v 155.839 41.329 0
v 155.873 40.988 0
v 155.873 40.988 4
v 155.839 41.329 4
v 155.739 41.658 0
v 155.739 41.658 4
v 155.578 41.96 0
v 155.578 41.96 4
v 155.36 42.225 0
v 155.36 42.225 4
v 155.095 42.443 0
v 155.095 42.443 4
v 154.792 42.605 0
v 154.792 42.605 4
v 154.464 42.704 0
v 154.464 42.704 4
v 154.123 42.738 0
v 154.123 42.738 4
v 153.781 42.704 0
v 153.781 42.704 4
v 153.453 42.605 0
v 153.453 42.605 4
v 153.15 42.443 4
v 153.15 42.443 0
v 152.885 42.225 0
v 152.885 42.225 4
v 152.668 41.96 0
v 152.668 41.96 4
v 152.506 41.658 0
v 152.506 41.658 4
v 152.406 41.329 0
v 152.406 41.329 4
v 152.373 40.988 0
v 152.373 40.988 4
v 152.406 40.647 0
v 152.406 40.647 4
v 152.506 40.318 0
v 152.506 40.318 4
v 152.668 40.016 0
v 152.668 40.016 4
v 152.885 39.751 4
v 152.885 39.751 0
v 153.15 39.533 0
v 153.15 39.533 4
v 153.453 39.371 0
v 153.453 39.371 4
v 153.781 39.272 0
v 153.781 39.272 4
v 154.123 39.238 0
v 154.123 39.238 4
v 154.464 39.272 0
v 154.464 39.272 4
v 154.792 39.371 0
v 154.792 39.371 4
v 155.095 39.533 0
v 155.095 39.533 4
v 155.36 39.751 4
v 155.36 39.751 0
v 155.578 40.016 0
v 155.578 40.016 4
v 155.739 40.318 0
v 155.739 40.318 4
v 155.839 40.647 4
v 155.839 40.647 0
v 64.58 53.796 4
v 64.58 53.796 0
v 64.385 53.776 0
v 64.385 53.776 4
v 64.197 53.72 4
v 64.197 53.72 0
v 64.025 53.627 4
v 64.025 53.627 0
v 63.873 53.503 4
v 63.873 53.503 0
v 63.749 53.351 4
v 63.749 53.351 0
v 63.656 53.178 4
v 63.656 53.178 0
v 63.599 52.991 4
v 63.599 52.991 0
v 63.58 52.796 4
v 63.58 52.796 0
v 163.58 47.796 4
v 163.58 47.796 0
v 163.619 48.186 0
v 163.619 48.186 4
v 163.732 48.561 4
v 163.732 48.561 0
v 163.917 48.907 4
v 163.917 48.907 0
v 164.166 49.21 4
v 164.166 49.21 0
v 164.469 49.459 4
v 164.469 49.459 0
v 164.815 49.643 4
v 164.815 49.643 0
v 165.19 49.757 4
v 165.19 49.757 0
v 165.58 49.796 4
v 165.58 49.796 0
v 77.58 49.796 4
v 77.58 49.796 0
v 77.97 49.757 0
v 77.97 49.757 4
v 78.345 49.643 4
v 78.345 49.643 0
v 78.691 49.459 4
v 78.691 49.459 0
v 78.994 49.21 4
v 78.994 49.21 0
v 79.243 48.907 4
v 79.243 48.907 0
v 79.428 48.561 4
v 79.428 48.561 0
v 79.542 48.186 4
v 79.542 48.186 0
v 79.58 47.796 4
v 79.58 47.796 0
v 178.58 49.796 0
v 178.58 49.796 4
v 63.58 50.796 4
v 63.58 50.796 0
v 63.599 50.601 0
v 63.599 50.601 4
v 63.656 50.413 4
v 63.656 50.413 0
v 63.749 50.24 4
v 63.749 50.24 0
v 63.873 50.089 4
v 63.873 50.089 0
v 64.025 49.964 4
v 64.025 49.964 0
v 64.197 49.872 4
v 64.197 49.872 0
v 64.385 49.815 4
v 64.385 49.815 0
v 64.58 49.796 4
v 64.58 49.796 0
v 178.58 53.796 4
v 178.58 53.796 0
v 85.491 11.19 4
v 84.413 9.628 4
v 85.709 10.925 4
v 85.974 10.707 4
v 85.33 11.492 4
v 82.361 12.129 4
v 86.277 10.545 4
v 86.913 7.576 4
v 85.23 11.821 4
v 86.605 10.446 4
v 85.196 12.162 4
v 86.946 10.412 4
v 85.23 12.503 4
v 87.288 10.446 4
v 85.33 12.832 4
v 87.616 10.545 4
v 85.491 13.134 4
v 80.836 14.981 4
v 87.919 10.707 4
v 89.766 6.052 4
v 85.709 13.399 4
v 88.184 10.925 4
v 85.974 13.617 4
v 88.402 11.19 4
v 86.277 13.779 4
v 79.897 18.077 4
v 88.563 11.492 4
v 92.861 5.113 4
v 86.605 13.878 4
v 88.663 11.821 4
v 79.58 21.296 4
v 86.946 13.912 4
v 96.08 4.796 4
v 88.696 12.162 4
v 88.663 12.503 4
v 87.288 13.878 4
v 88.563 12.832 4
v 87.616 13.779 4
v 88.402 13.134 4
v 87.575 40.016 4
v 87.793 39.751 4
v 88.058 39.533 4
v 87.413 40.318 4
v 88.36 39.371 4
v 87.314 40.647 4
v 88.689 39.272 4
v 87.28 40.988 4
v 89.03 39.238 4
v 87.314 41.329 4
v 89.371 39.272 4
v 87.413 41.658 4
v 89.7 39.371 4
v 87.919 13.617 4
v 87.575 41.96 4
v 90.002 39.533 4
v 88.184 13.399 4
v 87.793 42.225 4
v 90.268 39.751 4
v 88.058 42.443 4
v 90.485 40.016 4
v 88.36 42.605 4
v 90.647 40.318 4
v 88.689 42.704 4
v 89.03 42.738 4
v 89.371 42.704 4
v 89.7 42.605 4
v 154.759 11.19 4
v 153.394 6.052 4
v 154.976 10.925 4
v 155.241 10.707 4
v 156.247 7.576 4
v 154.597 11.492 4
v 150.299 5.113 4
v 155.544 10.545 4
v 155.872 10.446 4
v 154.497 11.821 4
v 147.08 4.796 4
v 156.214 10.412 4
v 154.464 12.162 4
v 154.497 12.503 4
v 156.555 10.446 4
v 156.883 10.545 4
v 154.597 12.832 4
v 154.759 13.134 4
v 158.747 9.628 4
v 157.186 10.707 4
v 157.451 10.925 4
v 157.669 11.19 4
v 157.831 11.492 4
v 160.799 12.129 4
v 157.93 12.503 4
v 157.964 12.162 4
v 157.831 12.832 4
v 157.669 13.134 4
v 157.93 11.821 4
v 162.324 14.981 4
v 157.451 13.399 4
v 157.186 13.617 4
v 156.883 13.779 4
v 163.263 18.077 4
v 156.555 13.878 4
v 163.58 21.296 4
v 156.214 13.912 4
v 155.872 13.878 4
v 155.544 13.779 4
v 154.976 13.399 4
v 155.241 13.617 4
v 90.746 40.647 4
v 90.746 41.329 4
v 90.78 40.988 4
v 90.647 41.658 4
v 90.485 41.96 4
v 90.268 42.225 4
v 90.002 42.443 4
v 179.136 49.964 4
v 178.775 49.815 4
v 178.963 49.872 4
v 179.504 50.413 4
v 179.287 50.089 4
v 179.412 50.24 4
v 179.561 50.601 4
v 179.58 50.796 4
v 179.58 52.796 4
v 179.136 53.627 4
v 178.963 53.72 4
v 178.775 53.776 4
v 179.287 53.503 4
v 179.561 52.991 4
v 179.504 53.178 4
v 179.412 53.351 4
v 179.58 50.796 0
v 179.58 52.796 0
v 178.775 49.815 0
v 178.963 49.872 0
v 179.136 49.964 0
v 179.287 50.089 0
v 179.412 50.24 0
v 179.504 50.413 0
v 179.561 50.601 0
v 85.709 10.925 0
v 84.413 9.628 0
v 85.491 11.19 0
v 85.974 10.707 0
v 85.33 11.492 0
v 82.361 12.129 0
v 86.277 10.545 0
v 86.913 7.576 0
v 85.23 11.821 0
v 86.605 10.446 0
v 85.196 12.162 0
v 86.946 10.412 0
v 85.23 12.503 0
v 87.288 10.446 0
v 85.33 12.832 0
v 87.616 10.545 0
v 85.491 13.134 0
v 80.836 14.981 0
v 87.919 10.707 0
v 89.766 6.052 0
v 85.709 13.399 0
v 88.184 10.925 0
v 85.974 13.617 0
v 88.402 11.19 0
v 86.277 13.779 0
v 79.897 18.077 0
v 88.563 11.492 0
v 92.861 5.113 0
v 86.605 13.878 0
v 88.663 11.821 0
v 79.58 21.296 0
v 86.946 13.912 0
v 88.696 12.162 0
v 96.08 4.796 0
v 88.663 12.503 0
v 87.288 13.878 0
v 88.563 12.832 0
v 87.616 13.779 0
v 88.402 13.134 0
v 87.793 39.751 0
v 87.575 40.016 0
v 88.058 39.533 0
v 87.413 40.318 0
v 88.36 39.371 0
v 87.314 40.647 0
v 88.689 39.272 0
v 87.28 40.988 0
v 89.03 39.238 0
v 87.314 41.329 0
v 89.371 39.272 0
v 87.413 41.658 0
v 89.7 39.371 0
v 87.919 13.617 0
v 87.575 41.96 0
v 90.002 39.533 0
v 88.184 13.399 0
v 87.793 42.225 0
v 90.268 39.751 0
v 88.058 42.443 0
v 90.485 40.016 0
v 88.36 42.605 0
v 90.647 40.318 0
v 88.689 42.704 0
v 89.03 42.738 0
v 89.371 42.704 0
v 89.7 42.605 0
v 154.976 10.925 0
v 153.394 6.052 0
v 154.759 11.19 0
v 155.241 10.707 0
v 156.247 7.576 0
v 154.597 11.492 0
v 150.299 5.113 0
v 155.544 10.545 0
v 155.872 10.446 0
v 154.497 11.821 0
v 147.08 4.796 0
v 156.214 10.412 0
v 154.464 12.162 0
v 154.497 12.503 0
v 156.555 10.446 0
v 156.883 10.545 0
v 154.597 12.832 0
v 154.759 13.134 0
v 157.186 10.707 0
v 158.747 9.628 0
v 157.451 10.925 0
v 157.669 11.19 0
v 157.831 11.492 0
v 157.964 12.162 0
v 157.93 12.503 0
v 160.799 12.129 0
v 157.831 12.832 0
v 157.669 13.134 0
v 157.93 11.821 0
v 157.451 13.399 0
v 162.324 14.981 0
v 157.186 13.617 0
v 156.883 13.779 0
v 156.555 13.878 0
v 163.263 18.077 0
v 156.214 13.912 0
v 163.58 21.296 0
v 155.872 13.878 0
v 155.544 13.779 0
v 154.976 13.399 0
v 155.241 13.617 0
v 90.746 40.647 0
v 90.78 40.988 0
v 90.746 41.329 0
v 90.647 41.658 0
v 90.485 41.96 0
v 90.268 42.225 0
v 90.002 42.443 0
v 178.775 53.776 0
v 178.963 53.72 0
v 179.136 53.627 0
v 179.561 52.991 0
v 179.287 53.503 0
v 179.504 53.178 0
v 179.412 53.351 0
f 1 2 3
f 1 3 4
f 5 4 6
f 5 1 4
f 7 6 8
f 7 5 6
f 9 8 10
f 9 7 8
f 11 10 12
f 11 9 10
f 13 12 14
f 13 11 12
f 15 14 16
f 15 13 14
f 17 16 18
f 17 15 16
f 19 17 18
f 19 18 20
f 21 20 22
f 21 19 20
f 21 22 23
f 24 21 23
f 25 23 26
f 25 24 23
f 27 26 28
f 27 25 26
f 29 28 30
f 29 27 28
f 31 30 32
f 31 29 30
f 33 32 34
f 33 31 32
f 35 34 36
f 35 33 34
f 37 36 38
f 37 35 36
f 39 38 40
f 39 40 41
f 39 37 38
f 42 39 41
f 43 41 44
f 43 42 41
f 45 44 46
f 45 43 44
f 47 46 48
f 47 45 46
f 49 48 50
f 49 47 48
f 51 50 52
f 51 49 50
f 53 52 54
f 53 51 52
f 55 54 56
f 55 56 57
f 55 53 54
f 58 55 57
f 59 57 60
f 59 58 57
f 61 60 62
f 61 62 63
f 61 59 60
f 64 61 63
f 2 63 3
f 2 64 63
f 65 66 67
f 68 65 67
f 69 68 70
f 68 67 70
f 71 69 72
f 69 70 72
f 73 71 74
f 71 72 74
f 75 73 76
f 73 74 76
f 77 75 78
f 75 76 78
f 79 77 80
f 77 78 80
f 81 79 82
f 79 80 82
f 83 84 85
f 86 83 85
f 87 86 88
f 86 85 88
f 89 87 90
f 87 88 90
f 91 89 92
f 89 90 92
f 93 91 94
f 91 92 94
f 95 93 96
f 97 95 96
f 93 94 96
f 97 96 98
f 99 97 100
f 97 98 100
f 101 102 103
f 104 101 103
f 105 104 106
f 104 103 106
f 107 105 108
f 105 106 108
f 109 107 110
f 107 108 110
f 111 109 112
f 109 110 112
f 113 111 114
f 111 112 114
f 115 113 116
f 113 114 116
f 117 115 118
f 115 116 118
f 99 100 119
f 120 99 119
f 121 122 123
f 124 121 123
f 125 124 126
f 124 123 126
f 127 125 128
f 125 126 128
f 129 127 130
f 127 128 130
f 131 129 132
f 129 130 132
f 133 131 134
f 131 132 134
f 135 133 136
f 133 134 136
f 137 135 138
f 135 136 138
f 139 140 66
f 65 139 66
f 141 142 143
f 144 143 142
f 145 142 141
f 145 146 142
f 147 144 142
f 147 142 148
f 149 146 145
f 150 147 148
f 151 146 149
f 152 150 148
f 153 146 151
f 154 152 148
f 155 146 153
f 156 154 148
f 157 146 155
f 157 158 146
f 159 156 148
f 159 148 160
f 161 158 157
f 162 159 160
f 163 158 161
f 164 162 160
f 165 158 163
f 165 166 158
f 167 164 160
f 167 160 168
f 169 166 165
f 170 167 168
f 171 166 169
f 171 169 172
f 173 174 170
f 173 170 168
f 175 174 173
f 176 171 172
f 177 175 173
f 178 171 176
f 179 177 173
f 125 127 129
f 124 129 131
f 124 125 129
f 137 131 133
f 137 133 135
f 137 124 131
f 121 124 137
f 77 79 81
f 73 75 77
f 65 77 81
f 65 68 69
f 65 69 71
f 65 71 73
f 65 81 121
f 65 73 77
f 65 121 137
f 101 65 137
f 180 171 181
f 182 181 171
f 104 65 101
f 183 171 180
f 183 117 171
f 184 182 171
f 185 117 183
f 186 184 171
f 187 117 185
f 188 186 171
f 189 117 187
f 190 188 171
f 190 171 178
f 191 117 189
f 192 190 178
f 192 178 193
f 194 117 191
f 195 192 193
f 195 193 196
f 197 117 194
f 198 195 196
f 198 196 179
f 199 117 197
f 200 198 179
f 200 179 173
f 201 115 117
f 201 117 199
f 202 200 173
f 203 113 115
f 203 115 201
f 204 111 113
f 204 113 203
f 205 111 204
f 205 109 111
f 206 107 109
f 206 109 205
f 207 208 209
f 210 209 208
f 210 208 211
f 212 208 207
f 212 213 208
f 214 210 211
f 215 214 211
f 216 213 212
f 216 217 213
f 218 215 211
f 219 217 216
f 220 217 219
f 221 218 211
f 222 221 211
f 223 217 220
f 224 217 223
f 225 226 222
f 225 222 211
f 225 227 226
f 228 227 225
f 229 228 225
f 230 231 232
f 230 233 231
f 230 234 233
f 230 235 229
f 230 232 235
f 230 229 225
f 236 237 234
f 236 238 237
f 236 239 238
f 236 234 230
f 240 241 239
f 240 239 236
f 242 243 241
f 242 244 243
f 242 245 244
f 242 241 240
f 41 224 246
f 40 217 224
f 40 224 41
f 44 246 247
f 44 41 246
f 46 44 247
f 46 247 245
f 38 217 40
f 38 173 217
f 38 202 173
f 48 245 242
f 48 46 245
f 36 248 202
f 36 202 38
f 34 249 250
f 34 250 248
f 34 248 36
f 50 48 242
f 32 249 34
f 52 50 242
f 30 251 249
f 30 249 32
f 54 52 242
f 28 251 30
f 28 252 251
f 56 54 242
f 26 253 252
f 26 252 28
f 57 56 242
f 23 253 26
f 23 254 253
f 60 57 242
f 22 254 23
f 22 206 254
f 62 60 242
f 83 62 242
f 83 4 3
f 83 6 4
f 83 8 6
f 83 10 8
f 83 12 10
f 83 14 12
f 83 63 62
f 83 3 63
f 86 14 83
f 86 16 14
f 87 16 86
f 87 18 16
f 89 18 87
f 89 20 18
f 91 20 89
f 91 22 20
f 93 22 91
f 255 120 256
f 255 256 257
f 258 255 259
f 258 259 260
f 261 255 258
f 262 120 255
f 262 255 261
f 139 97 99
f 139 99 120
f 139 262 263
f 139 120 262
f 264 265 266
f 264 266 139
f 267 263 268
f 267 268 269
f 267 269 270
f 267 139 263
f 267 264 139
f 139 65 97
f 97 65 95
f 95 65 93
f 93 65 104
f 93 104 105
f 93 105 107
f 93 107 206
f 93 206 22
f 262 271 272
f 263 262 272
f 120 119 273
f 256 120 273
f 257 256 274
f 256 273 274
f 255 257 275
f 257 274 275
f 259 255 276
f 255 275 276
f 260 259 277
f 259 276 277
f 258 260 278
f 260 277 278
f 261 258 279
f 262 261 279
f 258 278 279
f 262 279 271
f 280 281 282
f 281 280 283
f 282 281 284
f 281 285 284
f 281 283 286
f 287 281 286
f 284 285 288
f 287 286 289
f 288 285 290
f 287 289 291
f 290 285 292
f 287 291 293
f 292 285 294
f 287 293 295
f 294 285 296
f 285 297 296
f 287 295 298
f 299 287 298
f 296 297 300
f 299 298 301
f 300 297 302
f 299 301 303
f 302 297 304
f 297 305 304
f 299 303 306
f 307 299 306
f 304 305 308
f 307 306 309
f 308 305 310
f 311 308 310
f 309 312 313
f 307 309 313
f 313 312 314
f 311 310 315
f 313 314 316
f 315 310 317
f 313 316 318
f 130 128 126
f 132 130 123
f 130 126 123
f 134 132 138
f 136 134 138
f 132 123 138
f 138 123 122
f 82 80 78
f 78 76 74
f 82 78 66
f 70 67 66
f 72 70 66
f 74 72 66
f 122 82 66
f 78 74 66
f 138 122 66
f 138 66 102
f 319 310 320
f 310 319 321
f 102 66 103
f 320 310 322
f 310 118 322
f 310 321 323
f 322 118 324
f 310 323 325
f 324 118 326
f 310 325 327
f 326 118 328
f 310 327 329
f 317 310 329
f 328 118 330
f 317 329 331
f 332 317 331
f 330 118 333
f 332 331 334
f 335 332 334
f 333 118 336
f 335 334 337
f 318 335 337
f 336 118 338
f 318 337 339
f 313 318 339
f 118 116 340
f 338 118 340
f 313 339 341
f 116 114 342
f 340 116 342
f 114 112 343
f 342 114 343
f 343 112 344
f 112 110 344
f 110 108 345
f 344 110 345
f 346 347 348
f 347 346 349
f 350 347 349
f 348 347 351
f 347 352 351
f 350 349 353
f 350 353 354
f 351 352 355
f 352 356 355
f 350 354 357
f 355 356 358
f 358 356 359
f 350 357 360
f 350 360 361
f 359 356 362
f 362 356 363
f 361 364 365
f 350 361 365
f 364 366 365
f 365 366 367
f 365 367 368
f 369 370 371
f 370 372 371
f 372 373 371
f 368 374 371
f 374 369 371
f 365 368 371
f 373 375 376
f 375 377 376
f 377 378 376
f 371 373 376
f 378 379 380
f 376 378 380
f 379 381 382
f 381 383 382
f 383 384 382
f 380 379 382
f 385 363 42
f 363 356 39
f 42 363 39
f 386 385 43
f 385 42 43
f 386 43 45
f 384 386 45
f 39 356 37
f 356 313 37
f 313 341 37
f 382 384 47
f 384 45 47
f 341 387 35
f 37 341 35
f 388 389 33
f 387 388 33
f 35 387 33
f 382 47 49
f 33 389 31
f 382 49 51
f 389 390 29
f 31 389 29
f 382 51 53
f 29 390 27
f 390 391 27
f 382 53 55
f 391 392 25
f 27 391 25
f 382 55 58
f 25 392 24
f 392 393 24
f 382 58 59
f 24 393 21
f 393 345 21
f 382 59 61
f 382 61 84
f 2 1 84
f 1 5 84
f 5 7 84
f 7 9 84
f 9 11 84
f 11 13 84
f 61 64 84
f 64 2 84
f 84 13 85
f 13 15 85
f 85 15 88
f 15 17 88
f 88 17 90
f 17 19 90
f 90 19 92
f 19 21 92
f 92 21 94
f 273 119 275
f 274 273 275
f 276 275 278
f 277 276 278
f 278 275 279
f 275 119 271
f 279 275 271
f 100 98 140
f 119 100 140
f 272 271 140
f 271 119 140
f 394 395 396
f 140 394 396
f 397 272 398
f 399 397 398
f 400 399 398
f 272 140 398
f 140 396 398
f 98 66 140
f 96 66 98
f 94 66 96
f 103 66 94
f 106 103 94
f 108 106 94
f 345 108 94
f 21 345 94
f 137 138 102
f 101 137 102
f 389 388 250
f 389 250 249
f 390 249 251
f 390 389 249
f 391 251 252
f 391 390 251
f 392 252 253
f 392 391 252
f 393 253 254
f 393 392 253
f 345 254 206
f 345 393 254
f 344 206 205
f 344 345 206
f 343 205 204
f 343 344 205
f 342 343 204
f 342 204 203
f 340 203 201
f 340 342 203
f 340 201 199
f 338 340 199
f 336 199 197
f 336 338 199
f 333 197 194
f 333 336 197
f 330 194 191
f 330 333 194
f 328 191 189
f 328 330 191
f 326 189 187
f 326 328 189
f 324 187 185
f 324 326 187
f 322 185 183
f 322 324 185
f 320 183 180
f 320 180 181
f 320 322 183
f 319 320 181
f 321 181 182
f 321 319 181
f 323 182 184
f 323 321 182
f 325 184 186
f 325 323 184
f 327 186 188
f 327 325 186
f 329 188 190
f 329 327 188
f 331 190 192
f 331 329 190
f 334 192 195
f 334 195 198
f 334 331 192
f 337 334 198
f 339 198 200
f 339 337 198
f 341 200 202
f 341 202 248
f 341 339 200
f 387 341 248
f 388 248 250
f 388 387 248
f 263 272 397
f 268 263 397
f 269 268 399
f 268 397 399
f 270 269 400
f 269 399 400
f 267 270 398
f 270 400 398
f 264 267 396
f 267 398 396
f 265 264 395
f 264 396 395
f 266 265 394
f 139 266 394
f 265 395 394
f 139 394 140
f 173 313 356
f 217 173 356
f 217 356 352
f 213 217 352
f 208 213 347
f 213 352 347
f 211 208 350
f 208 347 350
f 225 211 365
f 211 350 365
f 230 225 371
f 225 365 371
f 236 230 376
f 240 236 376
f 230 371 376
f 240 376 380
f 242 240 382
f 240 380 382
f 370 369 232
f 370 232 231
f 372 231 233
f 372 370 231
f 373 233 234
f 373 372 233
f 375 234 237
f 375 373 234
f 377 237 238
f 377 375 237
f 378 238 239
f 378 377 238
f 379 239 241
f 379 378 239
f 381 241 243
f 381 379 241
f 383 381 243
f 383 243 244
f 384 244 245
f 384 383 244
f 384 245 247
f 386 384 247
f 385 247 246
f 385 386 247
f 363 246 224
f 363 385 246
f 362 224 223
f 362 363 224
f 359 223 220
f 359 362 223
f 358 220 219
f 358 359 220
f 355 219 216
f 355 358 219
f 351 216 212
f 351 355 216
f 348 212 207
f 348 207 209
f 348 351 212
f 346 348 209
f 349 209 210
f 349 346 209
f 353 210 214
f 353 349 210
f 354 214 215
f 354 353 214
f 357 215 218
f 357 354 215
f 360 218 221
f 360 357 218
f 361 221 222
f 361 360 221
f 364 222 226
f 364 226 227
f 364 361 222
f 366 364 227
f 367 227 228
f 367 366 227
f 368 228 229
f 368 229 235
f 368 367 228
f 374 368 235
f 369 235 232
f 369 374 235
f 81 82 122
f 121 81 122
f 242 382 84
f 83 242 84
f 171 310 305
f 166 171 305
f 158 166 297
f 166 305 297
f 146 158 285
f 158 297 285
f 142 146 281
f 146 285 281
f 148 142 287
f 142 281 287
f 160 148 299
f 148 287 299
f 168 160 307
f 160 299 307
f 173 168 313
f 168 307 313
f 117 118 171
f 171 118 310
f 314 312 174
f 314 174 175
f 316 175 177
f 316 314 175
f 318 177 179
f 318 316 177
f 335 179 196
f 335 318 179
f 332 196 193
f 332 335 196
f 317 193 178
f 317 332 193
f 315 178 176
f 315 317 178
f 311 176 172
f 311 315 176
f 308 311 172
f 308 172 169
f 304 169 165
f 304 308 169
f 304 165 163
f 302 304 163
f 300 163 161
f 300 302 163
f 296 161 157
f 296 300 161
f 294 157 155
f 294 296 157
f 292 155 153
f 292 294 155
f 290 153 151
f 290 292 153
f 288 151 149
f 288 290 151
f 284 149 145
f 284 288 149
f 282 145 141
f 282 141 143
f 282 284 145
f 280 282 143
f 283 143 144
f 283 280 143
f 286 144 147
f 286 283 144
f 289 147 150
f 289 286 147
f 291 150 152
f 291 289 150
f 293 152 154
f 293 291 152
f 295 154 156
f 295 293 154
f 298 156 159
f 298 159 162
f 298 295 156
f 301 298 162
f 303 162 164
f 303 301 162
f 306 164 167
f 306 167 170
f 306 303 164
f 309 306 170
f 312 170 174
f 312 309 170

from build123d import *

# Parameters (mm, degrees)
SKETCH1_R           = 1.75
BOSS_EXTRUDE1_DEPTH = 4


with BuildPart() as part:
    # Sketch1 → Boss-Extrude1 (new body)
    with BuildSketch(Plane.XY):
        with BuildLine():
            Line((163.58008547, 21.295659048), (163.58008547, 47.795659048))
            ThreePointArc((163.58008547, 47.795659048), (164.165871907, 49.209872611), (165.58008547, 49.795659048))
            Line((165.58008547, 49.795659048), (178.58008547, 49.795659048))
            ThreePointArc((178.58008547, 49.795659048), (179.287192251, 50.088552267), (179.58008547, 50.795659048))
            Line((179.58008547, 50.795659048), (179.58008547, 52.795659048))
            ThreePointArc((179.58008547, 52.795659048), (179.287192251, 53.502765829), (178.58008547, 53.795659048))
            Line((178.58008547, 53.795659048), (64.58008547, 53.795659048))
            ThreePointArc((64.58008547, 53.795659048), (63.872978688, 53.502765829), (63.58008547, 52.795659048))
            Line((63.58008547, 52.795659048), (63.58008547, 50.795659048))
            ThreePointArc((63.58008547, 50.795659048), (63.872978688, 50.088552267), (64.58008547, 49.795659048))
            Line((64.58008547, 49.795659048), (77.58008547, 49.795659048))
            ThreePointArc((77.58008547, 49.795659048), (78.994299032, 49.209872611), (79.58008547, 47.795659048))
            Line((79.58008547, 47.795659048), (79.58008547, 21.295659048))
            ThreePointArc((79.58008547, 21.295659048), (84.41282358, 9.628397159), (96.08008547, 4.795659048))
            Line((96.08008547, 4.795659048), (147.08008547, 4.795659048))
            ThreePointArc((147.08008547, 4.795659048), (158.747347359, 9.628397159), (163.58008547, 21.295659048))
        make_face()
        with Locations((89.03008547, 40.987963894)):
            Circle(SKETCH1_R, mode=Mode.SUBTRACT)
        with Locations((86.946454525, 12.162028103)):
            Circle(SKETCH1_R, mode=Mode.SUBTRACT)
        with Locations((154.12258547, 40.987963894)):
            Circle(SKETCH1_R, mode=Mode.SUBTRACT)
        with Locations((156.213716414, 12.162028103)):
            Circle(SKETCH1_R, mode=Mode.SUBTRACT)
    extrude(amount=BOSS_EXTRUDE1_DEPTH)


solid = part.part
